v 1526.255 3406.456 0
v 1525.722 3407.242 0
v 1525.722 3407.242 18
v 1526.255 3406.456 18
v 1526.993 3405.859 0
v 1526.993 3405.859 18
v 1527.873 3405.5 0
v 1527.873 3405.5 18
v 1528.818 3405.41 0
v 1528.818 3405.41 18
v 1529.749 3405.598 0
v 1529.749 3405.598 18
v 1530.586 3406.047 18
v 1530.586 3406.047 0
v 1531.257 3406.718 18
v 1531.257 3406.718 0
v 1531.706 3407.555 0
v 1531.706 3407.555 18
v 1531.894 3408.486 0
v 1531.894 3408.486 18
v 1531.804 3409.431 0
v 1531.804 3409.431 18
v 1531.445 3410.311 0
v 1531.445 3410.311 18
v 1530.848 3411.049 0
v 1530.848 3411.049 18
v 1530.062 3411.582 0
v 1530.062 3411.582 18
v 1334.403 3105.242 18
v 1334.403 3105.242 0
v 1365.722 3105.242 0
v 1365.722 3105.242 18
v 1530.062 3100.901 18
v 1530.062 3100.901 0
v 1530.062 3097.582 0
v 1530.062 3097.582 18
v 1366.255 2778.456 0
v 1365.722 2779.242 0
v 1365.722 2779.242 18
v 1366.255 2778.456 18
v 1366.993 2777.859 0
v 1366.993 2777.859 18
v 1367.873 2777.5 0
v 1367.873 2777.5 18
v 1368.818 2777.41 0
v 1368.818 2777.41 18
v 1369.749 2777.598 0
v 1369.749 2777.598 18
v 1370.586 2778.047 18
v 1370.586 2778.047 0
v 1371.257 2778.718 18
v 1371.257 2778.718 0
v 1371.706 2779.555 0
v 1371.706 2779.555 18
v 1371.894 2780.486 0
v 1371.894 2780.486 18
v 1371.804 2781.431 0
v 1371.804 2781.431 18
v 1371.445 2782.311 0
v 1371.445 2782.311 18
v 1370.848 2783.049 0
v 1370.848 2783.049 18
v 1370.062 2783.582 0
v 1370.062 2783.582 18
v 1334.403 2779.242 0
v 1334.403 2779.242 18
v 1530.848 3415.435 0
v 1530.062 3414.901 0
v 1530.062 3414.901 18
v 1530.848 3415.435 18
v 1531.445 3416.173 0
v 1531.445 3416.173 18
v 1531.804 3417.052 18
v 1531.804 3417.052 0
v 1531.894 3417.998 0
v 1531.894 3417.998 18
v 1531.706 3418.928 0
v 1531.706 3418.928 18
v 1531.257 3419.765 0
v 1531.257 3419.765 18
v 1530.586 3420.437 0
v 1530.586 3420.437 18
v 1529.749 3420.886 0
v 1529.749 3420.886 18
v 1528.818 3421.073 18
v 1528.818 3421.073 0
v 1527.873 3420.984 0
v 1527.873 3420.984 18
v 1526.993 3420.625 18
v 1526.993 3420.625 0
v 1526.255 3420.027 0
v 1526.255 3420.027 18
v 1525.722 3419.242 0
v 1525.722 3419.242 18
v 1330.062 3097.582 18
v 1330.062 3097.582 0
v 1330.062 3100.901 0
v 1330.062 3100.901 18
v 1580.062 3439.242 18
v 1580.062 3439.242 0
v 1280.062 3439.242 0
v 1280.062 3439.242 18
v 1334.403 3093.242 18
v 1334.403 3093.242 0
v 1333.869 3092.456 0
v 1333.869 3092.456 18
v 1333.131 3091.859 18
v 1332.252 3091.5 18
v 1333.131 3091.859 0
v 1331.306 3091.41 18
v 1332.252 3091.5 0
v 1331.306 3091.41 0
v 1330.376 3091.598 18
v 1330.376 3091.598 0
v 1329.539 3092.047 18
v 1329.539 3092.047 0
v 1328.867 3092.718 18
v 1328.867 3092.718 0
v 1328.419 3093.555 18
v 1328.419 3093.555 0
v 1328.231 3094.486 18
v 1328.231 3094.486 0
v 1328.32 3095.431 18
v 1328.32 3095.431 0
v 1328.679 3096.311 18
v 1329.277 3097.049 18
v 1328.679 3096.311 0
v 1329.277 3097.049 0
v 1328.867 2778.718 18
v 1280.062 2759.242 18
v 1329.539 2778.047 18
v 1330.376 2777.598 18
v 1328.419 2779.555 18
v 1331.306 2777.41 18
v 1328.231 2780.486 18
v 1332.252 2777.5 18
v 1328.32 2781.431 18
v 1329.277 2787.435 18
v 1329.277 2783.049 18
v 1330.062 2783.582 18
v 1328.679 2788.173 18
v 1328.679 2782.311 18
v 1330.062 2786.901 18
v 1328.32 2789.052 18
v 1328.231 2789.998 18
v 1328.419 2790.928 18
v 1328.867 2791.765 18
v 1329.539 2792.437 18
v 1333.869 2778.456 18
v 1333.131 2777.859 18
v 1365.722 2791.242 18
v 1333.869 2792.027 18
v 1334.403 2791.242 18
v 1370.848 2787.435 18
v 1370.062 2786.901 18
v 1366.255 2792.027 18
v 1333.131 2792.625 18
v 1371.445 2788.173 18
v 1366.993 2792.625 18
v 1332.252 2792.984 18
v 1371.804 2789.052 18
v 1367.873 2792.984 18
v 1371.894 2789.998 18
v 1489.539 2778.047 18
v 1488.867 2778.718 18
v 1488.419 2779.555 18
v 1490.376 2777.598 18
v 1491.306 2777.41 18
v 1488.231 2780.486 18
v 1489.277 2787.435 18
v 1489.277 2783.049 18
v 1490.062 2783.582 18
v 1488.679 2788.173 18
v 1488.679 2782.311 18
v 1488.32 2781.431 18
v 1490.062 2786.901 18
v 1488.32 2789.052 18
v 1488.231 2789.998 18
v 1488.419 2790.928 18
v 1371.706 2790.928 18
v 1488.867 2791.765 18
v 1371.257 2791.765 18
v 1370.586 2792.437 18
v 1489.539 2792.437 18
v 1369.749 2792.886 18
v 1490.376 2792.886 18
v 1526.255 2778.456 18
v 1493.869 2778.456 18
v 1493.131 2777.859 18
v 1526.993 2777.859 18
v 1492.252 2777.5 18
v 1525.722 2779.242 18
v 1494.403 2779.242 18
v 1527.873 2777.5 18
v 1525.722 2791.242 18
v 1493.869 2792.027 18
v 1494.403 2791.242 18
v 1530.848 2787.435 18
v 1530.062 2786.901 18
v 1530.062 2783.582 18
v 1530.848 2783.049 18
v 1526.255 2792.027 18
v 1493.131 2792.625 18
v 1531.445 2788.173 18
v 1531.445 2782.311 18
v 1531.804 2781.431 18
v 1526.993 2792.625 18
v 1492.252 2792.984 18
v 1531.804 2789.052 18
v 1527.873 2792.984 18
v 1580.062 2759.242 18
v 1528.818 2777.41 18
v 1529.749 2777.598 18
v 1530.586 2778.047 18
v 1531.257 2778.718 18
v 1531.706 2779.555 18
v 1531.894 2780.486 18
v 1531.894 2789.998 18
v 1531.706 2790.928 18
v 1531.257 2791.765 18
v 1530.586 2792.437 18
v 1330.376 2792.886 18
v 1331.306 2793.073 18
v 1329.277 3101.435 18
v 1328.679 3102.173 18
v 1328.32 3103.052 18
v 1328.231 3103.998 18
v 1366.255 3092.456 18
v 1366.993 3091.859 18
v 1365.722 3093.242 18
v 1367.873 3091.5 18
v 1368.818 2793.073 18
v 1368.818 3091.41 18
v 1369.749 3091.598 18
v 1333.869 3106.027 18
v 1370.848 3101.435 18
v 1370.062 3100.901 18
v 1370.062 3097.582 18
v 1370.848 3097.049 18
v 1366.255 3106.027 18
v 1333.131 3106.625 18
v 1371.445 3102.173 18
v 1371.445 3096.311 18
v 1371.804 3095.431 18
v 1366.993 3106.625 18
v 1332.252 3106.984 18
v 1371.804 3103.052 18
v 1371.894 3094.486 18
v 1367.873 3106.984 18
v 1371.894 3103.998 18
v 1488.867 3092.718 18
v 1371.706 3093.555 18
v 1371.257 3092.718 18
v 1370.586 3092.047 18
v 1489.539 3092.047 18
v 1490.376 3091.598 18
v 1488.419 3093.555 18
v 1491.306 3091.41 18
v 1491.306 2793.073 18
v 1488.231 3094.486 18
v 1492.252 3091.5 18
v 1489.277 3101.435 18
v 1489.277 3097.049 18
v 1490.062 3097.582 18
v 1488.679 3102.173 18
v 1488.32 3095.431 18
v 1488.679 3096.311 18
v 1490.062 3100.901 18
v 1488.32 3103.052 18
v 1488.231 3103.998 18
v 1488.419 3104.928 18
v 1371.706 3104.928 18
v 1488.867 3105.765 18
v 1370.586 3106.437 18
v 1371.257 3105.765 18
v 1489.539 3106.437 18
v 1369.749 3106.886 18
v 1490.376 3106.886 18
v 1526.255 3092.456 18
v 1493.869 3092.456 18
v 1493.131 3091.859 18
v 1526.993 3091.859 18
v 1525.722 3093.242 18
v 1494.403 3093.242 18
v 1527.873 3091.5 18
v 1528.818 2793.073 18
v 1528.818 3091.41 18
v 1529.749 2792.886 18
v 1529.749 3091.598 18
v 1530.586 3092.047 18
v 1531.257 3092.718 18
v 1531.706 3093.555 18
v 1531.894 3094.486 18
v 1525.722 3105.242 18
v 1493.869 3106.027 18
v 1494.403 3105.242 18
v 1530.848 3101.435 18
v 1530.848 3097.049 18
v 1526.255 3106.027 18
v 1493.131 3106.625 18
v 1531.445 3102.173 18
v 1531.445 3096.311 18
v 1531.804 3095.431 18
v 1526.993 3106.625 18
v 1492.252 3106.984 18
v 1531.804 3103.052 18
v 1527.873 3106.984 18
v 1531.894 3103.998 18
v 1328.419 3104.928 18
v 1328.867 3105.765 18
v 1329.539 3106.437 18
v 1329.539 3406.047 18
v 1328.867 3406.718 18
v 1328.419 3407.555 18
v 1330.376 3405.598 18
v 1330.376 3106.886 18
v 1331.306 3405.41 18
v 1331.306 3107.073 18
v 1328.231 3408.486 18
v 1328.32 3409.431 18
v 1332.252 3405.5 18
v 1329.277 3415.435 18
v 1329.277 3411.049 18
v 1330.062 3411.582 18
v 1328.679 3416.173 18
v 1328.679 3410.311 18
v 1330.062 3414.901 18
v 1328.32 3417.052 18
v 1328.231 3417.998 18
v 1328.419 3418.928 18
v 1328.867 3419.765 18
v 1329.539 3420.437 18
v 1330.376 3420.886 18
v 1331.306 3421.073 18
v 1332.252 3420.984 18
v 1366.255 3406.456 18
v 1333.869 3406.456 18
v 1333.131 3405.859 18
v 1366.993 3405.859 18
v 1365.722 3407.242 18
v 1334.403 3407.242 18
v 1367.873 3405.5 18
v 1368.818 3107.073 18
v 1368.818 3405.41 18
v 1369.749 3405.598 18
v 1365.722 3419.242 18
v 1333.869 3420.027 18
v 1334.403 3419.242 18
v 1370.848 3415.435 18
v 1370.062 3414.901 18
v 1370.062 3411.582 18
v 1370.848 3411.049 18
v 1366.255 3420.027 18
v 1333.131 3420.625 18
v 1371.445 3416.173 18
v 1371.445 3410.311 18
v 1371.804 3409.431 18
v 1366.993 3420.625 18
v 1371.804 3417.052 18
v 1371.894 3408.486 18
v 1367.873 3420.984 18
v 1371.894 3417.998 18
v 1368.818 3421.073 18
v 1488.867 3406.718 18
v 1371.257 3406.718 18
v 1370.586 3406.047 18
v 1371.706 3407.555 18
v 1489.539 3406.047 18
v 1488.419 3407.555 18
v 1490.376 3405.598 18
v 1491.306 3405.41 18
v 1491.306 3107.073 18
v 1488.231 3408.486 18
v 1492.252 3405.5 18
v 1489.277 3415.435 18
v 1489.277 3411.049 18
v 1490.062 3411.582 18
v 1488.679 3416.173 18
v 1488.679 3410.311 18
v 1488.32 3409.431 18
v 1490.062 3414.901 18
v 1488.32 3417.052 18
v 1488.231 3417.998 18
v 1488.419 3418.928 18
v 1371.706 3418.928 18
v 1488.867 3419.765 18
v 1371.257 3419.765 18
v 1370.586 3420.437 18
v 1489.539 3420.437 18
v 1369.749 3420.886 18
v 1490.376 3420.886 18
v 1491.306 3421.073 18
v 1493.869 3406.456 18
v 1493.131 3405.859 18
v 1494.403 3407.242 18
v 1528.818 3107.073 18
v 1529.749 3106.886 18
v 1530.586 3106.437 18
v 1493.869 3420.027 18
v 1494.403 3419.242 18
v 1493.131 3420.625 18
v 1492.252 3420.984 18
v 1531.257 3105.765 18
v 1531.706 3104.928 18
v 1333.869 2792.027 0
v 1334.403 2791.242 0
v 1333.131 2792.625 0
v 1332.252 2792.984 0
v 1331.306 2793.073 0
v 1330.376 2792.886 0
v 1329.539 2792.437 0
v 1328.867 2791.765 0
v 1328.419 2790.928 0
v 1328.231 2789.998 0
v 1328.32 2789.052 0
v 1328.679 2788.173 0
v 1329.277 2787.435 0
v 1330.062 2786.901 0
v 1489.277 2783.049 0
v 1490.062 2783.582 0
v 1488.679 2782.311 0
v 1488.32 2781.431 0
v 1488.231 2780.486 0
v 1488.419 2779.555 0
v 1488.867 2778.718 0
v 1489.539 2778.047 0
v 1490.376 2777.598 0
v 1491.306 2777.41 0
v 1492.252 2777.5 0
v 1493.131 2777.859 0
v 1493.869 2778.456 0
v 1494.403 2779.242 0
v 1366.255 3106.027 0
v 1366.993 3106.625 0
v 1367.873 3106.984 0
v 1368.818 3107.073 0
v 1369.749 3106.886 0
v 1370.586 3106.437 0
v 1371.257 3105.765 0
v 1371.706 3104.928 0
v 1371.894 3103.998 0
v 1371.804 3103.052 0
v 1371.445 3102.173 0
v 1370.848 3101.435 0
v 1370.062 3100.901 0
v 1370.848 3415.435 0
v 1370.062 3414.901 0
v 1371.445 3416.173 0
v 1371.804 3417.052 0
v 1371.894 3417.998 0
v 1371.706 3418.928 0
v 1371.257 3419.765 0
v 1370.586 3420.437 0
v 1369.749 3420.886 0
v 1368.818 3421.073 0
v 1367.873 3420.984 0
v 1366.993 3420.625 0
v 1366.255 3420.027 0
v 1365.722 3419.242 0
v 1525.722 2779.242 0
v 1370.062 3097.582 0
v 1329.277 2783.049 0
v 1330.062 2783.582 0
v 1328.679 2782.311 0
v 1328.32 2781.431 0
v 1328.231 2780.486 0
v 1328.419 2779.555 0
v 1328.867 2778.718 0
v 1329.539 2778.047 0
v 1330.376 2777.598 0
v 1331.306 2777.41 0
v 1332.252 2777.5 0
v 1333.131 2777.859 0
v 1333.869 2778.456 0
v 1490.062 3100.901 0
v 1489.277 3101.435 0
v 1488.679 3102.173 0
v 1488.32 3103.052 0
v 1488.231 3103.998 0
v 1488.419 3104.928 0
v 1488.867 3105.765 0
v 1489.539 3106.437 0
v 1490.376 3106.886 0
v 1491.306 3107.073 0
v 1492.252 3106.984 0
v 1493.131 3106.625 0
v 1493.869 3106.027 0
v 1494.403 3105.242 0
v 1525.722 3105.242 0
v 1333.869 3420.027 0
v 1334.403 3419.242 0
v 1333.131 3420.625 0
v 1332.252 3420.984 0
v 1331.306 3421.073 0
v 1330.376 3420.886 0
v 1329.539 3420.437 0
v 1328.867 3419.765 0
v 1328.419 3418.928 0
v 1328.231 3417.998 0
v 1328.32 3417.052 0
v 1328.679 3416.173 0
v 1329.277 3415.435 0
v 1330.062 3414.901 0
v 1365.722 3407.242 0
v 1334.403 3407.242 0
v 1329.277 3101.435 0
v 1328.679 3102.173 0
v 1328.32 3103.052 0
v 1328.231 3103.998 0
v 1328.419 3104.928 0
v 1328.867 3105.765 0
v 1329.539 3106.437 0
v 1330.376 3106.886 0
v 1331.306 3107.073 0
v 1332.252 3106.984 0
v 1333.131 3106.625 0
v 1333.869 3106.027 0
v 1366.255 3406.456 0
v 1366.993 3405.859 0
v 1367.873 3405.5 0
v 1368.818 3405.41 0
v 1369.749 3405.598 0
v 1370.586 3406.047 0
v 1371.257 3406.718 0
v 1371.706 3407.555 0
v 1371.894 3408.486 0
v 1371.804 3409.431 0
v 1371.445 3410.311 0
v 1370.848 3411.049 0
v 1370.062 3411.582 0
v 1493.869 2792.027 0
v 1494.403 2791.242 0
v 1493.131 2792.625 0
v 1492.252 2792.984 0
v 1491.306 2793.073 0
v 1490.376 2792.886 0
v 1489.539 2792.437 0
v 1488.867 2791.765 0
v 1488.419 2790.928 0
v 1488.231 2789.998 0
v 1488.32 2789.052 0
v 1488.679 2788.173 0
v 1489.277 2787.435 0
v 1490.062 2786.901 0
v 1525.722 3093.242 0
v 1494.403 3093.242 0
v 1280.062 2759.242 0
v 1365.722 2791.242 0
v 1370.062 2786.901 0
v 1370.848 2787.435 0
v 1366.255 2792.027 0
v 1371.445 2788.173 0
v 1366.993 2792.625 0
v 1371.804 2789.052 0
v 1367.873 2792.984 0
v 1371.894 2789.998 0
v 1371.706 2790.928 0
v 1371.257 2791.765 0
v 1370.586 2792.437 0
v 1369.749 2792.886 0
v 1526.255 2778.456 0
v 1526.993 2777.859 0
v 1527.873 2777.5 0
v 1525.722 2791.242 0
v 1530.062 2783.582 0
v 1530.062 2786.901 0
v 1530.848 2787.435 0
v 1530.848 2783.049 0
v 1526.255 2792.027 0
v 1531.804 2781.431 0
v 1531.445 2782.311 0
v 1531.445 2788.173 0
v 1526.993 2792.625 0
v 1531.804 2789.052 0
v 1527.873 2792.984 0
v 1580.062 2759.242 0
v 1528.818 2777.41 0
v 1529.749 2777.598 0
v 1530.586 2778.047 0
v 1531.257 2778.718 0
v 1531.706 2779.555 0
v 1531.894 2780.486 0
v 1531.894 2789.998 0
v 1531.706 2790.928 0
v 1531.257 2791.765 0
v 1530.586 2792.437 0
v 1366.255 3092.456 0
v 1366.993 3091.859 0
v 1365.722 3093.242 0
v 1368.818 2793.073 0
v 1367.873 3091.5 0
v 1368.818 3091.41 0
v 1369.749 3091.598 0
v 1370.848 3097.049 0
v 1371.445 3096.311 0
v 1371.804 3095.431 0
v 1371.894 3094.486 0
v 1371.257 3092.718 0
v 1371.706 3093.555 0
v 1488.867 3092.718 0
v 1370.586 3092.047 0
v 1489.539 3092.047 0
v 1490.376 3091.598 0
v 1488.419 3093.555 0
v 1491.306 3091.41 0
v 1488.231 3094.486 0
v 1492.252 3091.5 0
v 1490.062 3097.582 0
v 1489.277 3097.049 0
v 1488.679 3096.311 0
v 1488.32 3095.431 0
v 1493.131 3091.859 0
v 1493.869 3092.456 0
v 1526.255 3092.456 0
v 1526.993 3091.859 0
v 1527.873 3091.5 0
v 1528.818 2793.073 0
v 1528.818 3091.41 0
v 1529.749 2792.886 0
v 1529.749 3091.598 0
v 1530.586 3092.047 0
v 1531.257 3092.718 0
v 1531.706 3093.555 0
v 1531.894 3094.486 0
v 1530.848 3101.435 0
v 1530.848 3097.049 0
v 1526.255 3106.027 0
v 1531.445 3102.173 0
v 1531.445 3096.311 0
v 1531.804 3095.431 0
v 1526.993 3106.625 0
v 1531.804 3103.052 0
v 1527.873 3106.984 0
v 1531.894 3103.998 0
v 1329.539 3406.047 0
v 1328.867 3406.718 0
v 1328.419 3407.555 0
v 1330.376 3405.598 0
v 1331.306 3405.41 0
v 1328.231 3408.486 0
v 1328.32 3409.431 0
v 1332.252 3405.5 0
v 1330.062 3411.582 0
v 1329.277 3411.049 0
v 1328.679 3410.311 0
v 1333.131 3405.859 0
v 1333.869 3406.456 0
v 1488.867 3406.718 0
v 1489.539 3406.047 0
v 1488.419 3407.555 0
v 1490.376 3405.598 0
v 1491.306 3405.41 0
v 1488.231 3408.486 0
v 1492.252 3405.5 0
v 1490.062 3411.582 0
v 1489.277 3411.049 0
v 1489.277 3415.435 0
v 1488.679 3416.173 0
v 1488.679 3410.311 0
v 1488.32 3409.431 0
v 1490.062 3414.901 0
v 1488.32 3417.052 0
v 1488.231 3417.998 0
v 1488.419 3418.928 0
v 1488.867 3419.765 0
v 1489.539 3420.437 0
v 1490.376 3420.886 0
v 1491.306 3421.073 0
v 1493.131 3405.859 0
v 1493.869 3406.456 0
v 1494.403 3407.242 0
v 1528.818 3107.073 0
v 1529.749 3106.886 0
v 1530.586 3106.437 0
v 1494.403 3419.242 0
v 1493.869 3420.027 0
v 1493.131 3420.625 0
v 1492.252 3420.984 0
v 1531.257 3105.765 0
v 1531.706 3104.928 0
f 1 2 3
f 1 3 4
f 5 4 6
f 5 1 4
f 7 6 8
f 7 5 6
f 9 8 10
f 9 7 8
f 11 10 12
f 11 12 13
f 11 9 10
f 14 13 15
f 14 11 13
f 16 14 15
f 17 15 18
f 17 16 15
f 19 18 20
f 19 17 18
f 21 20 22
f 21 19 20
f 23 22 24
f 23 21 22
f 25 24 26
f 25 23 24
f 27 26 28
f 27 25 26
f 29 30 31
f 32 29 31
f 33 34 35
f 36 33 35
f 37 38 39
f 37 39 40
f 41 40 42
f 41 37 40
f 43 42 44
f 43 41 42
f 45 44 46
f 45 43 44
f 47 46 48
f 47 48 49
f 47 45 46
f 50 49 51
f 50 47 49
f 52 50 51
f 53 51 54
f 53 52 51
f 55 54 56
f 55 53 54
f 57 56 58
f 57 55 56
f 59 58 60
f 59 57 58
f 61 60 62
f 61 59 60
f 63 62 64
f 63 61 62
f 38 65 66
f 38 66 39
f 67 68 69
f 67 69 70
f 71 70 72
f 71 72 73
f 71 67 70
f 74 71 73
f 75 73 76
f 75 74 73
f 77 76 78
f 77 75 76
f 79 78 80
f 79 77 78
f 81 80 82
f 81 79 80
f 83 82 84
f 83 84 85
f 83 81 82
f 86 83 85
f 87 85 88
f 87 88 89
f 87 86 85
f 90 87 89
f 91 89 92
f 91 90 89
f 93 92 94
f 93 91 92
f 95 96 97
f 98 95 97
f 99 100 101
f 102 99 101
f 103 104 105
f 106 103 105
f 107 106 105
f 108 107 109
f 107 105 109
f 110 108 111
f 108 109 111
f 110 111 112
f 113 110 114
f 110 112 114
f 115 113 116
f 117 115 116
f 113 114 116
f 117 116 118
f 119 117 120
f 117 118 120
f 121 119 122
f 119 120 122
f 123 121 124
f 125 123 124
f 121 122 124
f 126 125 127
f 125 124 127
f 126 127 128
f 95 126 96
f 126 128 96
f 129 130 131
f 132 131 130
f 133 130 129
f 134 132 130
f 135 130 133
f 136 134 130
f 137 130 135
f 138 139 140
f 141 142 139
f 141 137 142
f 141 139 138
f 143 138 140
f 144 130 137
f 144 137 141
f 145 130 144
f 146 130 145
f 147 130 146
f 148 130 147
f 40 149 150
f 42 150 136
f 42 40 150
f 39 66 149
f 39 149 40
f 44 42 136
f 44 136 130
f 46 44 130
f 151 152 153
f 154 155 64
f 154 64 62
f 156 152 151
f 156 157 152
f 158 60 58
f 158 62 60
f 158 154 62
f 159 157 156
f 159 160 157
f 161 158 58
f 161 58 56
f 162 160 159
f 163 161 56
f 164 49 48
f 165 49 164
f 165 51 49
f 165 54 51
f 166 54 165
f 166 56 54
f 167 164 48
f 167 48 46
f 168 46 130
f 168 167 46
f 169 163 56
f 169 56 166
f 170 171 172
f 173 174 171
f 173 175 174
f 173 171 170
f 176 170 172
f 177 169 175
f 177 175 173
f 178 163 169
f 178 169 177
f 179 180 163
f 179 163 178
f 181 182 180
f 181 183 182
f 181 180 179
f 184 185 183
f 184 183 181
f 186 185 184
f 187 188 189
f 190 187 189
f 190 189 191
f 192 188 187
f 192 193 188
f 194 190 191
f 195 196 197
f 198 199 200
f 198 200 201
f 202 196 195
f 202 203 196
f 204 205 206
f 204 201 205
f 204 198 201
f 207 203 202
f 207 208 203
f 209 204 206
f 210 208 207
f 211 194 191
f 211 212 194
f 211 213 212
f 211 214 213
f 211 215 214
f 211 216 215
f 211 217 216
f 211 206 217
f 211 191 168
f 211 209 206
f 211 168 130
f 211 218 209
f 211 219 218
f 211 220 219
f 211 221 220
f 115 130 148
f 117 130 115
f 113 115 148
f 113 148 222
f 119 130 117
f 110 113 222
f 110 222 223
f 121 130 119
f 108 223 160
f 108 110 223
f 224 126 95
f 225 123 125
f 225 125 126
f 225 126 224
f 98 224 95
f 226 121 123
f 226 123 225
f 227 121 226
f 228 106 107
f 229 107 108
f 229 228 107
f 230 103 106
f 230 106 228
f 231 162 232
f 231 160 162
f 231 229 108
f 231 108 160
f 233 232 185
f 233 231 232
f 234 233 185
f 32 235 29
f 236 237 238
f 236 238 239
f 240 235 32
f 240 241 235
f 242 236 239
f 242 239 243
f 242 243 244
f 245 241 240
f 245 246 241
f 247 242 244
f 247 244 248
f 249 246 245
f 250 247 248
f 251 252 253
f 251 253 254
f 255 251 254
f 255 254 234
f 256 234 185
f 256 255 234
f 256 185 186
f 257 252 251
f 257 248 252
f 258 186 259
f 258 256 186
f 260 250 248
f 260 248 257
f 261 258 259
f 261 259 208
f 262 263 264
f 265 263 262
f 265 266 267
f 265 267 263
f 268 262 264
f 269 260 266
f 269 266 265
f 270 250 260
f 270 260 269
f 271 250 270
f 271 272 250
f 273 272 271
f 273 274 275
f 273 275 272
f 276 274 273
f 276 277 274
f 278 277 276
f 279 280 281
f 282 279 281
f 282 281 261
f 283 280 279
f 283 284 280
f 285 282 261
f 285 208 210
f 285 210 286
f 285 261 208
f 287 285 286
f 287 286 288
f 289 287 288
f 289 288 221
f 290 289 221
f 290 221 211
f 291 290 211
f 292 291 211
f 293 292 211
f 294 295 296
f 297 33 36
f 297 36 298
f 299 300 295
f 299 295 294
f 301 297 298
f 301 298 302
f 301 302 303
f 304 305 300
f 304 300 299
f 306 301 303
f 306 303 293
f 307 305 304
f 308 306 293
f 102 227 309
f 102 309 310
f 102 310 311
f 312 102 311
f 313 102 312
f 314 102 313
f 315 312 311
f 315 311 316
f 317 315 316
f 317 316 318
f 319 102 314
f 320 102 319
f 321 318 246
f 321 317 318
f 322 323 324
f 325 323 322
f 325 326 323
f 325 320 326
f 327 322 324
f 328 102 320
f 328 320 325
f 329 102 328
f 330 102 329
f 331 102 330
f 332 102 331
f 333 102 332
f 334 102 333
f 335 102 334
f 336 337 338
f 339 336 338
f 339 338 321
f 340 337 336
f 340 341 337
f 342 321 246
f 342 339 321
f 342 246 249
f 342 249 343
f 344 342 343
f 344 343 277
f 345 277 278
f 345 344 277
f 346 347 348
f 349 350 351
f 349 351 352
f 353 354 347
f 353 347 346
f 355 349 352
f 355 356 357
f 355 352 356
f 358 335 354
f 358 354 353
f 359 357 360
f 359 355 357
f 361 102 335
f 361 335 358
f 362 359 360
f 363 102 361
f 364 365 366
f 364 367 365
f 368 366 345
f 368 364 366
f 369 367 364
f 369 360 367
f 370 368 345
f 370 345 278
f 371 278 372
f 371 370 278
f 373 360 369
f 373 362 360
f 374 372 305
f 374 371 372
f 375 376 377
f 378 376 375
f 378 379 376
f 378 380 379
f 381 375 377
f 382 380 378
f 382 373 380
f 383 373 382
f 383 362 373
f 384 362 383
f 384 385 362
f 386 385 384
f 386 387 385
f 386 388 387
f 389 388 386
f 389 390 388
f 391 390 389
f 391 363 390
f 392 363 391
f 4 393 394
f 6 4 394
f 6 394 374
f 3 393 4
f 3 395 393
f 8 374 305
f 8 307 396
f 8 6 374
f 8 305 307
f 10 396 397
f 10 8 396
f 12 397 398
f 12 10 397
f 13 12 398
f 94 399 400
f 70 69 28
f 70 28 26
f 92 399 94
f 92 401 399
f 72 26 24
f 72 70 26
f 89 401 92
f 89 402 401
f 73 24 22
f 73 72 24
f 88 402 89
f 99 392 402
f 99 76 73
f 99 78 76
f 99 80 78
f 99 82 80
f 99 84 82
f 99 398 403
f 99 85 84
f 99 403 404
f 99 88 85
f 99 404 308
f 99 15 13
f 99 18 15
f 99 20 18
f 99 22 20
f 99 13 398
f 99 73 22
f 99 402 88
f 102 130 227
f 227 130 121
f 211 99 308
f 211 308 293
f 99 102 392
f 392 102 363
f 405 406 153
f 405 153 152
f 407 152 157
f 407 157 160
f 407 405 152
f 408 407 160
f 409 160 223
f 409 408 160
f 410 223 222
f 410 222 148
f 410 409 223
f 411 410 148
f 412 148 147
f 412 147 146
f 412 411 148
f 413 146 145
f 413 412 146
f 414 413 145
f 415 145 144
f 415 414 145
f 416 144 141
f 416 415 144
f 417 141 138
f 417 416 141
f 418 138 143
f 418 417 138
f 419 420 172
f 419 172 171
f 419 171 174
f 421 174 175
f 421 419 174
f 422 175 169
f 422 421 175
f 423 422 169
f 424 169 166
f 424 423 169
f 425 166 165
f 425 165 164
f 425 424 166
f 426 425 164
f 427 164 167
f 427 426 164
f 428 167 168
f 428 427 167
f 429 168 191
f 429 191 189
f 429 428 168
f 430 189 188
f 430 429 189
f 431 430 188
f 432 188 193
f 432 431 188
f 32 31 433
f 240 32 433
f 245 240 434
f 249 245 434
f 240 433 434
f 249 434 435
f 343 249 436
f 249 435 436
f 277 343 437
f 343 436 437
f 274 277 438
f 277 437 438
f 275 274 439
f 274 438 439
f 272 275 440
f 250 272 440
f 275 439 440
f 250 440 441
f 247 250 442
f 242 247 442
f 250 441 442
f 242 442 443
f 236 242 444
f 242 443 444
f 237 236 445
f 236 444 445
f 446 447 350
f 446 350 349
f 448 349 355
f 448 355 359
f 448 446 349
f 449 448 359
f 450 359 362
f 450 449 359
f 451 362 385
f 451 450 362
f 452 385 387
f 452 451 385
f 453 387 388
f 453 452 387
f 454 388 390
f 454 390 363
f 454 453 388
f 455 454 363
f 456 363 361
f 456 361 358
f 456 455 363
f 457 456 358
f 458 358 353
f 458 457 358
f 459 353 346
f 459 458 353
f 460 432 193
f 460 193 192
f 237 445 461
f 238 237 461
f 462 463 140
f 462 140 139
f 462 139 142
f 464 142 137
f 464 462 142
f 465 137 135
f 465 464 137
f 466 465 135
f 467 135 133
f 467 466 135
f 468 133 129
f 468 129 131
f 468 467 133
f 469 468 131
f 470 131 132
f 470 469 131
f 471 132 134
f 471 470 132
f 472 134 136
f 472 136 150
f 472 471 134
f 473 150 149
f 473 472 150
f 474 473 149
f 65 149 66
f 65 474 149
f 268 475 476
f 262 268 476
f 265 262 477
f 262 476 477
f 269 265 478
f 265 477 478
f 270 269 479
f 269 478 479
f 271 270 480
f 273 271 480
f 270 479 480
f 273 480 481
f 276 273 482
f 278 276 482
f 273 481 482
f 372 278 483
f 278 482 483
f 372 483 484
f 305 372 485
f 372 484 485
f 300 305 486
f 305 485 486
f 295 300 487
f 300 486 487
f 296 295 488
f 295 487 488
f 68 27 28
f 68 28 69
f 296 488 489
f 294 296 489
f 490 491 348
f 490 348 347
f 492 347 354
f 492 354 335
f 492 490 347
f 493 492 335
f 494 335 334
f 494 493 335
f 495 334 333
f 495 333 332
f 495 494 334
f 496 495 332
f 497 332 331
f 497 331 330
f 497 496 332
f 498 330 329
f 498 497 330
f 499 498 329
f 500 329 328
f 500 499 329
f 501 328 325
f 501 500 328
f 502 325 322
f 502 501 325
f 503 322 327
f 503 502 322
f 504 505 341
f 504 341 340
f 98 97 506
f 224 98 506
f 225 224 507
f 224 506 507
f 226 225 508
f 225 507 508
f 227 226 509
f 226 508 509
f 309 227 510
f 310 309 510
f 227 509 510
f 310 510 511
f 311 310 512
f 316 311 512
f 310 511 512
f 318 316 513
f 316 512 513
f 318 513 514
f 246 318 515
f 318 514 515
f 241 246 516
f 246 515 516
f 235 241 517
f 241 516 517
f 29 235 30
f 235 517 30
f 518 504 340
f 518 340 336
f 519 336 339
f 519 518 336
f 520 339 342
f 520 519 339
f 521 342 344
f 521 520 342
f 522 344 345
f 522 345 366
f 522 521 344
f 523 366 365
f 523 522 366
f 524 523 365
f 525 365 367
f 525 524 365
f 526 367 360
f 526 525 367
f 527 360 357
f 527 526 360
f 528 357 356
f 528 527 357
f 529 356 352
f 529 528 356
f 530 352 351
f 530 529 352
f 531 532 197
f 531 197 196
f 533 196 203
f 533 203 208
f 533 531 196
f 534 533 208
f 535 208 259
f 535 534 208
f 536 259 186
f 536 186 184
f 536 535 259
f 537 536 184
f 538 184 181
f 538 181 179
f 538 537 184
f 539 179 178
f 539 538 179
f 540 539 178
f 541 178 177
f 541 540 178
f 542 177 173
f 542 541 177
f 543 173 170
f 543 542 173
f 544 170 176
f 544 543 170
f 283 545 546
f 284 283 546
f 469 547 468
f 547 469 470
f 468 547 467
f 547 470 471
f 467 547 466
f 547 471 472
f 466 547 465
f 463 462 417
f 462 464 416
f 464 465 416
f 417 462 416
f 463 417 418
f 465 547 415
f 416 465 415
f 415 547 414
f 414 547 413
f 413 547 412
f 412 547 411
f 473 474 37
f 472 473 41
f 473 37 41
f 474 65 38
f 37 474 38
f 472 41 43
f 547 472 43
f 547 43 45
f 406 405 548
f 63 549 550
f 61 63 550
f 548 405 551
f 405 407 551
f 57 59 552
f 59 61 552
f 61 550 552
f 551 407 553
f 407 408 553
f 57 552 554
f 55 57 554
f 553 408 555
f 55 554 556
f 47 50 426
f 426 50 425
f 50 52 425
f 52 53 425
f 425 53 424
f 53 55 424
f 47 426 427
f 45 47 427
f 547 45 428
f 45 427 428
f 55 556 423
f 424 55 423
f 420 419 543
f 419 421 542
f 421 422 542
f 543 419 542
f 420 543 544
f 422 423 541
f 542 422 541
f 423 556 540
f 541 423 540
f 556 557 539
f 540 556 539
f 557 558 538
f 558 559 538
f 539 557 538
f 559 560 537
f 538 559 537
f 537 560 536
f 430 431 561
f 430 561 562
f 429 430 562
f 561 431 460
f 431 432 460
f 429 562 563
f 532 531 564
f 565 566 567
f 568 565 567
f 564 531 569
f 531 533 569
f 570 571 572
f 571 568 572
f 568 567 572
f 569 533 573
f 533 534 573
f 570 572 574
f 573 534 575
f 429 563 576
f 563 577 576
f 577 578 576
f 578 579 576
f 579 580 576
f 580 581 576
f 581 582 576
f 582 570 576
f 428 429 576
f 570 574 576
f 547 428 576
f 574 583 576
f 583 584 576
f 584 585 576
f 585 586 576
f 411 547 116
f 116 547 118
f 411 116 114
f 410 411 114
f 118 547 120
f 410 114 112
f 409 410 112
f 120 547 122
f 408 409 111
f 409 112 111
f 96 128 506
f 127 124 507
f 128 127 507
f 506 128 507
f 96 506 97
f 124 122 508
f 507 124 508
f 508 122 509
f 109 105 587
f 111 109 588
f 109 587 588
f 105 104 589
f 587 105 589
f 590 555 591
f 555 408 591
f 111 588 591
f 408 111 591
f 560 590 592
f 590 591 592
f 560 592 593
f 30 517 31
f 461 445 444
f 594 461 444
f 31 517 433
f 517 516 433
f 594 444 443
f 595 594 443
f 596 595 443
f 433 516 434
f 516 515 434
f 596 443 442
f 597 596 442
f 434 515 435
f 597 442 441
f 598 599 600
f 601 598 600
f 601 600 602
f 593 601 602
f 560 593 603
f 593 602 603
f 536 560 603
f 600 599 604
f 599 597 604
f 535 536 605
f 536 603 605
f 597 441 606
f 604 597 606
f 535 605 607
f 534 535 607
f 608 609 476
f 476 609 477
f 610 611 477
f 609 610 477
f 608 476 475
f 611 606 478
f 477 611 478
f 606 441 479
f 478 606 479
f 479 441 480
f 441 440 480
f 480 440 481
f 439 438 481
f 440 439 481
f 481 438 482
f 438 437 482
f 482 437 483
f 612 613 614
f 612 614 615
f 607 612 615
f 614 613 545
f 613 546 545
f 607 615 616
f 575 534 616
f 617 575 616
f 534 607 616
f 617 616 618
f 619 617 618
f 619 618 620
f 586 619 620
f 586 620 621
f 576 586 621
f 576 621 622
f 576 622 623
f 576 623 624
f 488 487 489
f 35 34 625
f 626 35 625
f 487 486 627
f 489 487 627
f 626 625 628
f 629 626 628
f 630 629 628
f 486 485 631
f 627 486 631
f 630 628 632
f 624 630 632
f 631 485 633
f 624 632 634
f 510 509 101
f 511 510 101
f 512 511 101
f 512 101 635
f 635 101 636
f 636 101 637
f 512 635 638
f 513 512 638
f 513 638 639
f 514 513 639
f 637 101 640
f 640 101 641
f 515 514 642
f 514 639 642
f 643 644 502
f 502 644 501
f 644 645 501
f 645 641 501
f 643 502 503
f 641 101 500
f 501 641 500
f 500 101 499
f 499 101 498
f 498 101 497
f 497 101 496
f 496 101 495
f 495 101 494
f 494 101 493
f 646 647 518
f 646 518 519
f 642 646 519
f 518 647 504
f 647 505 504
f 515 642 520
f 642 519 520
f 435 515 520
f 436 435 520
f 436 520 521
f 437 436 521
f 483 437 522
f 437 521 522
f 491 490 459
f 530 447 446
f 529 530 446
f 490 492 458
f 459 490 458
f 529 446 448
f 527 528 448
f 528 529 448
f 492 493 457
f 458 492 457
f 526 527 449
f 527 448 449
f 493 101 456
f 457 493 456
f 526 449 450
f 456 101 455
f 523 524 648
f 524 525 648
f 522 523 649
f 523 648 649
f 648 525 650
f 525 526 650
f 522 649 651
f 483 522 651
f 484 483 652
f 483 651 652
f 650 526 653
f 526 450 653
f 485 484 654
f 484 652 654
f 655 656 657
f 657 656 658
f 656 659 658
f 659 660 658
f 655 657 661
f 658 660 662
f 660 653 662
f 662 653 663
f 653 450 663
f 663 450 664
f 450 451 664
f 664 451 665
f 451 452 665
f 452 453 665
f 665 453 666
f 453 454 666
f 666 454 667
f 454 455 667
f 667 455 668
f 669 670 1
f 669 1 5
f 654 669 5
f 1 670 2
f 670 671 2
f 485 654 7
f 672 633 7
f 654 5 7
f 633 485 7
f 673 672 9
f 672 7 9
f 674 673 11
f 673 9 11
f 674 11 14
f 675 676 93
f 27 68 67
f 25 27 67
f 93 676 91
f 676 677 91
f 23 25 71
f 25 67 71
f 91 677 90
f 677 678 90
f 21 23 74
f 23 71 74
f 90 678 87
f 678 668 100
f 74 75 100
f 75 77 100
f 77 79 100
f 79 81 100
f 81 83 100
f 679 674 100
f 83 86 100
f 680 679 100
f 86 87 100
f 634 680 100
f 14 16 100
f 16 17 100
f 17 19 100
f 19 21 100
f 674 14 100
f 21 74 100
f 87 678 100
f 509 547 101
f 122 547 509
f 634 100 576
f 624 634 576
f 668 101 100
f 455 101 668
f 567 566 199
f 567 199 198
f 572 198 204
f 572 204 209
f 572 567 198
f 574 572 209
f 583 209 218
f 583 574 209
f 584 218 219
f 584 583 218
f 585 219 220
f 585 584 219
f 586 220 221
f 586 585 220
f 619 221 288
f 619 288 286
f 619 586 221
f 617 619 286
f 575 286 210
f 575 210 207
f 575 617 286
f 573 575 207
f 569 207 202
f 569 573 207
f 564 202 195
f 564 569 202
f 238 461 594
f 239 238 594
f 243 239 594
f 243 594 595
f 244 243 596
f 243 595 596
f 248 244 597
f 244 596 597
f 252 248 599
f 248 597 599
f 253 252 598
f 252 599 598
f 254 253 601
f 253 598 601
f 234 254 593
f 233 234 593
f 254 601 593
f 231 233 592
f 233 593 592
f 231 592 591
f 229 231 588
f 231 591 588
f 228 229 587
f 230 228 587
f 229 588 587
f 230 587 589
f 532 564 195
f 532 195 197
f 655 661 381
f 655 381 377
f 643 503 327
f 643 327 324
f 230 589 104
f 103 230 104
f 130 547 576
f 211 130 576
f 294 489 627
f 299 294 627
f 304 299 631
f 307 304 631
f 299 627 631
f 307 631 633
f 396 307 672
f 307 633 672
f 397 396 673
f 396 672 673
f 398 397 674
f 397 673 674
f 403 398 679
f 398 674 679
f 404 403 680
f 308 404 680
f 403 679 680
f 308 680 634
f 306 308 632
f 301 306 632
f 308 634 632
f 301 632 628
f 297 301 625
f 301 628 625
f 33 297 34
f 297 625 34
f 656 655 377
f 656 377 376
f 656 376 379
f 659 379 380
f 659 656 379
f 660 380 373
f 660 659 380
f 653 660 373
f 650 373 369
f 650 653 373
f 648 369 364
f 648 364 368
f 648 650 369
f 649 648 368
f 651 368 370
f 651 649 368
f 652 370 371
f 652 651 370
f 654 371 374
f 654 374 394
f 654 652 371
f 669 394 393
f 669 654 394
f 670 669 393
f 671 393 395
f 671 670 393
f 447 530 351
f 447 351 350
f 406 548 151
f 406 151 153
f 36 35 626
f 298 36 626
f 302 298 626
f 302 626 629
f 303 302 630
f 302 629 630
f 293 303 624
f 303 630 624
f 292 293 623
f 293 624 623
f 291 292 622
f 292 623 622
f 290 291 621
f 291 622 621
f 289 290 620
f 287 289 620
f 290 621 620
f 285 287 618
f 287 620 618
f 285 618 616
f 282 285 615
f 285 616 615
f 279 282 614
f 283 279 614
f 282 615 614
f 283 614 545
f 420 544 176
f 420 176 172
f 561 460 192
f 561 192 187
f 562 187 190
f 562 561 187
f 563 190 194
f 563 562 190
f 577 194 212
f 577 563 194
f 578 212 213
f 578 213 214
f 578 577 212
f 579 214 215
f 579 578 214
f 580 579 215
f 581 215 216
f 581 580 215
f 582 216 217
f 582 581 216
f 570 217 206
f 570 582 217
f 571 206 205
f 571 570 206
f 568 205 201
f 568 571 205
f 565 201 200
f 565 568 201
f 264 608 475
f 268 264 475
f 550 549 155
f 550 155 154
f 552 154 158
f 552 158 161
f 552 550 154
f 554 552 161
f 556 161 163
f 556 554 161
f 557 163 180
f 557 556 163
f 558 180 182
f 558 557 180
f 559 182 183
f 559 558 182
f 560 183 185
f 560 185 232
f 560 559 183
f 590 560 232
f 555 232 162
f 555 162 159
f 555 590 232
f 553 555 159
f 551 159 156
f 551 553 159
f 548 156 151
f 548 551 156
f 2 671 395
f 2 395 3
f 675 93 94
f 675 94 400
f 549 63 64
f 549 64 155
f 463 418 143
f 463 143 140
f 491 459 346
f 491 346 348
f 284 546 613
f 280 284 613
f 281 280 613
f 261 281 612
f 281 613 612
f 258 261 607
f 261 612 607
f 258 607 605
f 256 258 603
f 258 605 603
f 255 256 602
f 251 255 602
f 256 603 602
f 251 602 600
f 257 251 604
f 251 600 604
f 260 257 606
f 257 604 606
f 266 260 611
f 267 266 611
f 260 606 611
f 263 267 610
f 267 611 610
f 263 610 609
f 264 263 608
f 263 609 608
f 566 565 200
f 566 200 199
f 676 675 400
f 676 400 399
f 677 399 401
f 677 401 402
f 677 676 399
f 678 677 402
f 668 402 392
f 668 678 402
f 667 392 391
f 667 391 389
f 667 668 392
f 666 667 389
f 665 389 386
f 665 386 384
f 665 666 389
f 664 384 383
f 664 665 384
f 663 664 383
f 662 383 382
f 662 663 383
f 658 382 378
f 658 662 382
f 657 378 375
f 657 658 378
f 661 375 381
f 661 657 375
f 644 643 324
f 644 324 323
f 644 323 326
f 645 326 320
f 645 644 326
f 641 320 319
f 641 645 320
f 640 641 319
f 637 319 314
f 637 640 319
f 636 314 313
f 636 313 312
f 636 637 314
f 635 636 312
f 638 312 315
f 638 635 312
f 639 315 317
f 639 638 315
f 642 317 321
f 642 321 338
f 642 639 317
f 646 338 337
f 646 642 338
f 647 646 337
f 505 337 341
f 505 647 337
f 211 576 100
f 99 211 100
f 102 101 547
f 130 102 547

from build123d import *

# Parameters (mm, degrees)
BOSS_EXTRUDE1_DEPTH = 18


with BuildPart() as part:
    # Sketch1 → Boss-Extrude1 (new body)
    with BuildSketch(Plane.XY):
        Polygon((1280.062211089, 3439.241832817), (1280.062211089, 3419.241832817), (1280.062211089, 3407.241832817), (1280.062211089, 3105.241832817), (1280.062211089, 3093.241832817), (1280.062211089, 2791.241832817), (1280.062211089, 2779.241832817), (1280.062211089, 2759.241832817), (1580.062211089, 2759.241832817), (1580.062211089, 2779.241832817), (1580.062211089, 2791.241832817), (1580.062211089, 3093.241832817), (1580.062211089, 3105.241832817), (1580.062211089, 3407.241832817), (1580.062211089, 3419.241832817), (1580.062211089, 3439.241832817), align=None)
        with BuildLine():
            Line((1525.721822549, 3093.241832817), (1494.402599629, 3093.241832817))
            ThreePointArc((1494.402599629, 3093.241832817), (1489.178327612, 3092.357949341), (1490.062211089, 3097.582221357))
            Line((1490.062211089, 3097.582221357), (1490.062211089, 3100.901444277))
            ThreePointArc((1490.062211089, 3100.901444277), (1489.178327612, 3106.125716294), (1494.402599629, 3105.241832817))
            Line((1494.402599629, 3105.241832817), (1525.721822549, 3105.241832817))
            ThreePointArc((1525.721822549, 3105.241832817), (1530.946094565, 3106.125716294), (1530.062211089, 3100.901444277))
            Line((1530.062211089, 3100.901444277), (1530.062211089, 3097.582221357))
            ThreePointArc((1530.062211089, 3097.582221357), (1530.946094565, 3092.357949341), (1525.721822549, 3093.241832817))
        make_face(mode=Mode.SUBTRACT)
        with BuildLine():
            Line((1365.721822549, 2791.241832817), (1334.402599629, 2791.241832817))
            ThreePointArc((1334.402599629, 2791.241832817), (1329.178327612, 2792.125716294), (1330.062211089, 2786.901444277))
            Line((1330.062211089, 2786.901444277), (1330.062211089, 2783.582221357))
            ThreePointArc((1330.062211089, 2783.582221357), (1329.178327612, 2778.357949341), (1334.402599629, 2779.241832817))
            Line((1334.402599629, 2779.241832817), (1365.721822549, 2779.241832817))
            ThreePointArc((1365.721822549, 2779.241832817), (1370.946094565, 2778.357949341), (1370.062211089, 2783.582221357))
            Line((1370.062211089, 2783.582221357), (1370.062211089, 2786.901444277))
            ThreePointArc((1370.062211089, 2786.901444277), (1370.946094565, 2792.125716294), (1365.721822549, 2791.241832817))
        make_face(mode=Mode.SUBTRACT)
        with BuildLine():
            Line((1330.062211089, 3414.901444277), (1330.062211089, 3411.582221357))
            ThreePointArc((1330.062211089, 3411.582221357), (1329.178327612, 3406.357949341), (1334.402599629, 3407.241832817))
            Line((1334.402599629, 3407.241832817), (1365.721822549, 3407.241832817))
            ThreePointArc((1365.721822549, 3407.241832817), (1370.946094565, 3406.357949341), (1370.062211089, 3411.582221357))
            Line((1370.062211089, 3411.582221357), (1370.062211089, 3414.901444277))
            ThreePointArc((1370.062211089, 3414.901444277), (1370.946094565, 3420.125716294), (1365.721822549, 3419.241832817))
            Line((1365.721822549, 3419.241832817), (1334.402599629, 3419.241832817))
            ThreePointArc((1334.402599629, 3419.241832817), (1329.178327612, 3420.125716294), (1330.062211089, 3414.901444277))
        make_face(mode=Mode.SUBTRACT)
        with BuildLine():
            Line((1334.402599629, 3105.241832817), (1365.721822549, 3105.241832817))
            ThreePointArc((1365.721822549, 3105.241832817), (1370.946094565, 3106.125716294), (1370.062211089, 3100.901444277))
            Line((1370.062211089, 3100.901444277), (1370.062211089, 3097.582221357))
            ThreePointArc((1370.062211089, 3097.582221357), (1370.946094565, 3092.357949341), (1365.721822549, 3093.241832817))
            Line((1365.721822549, 3093.241832817), (1334.402599629, 3093.241832817))
            ThreePointArc((1334.402599629, 3093.241832817), (1329.178327612, 3092.357949341), (1330.062211089, 3097.582221357))
            Line((1330.062211089, 3097.582221357), (1330.062211089, 3100.901444277))
            ThreePointArc((1330.062211089, 3100.901444277), (1329.178327612, 3106.125716294), (1334.402599629, 3105.241832817))
        make_face(mode=Mode.SUBTRACT)
        with BuildLine():
            Line((1530.062211089, 2783.582221357), (1530.062211089, 2786.901444277))
            ThreePointArc((1530.062211089, 2786.901444277), (1530.946094565, 2792.125716294), (1525.721822549, 2791.241832817))
            Line((1525.721822549, 2791.241832817), (1494.402599629, 2791.241832817))
            ThreePointArc((1494.402599629, 2791.241832817), (1489.178327612, 2792.125716294), (1490.062211089, 2786.901444277))
            Line((1490.062211089, 2786.901444277), (1490.062211089, 2783.582221357))
            ThreePointArc((1490.062211089, 2783.582221357), (1489.178327612, 2778.357949341), (1494.402599629, 2779.241832817))
            Line((1494.402599629, 2779.241832817), (1525.721822549, 2779.241832817))
            ThreePointArc((1525.721822549, 2779.241832817), (1530.946094565, 2778.357949341), (1530.062211089, 2783.582221357))
        make_face(mode=Mode.SUBTRACT)
        with BuildLine():
            Line((1494.402599629, 3407.241832817), (1525.721822549, 3407.241832817))
            ThreePointArc((1525.721822549, 3407.241832817), (1530.946094565, 3406.357949341), (1530.062211089, 3411.582221357))
            Line((1530.062211089, 3411.582221357), (1530.062211089, 3414.901444277))
            ThreePointArc((1530.062211089, 3414.901444277), (1530.946094565, 3420.125716294), (1525.721822549, 3419.241832817))
            Line((1525.721822549, 3419.241832817), (1494.402599629, 3419.241832817))
            ThreePointArc((1494.402599629, 3419.241832817), (1489.178327612, 3420.125716294), (1490.062211089, 3414.901444277))
            Line((1490.062211089, 3414.901444277), (1490.062211089, 3411.582221357))
            ThreePointArc((1490.062211089, 3411.582221357), (1489.178327612, 3406.357949341), (1494.402599629, 3407.241832817))
        make_face(mode=Mode.SUBTRACT)
    extrude(amount=BOSS_EXTRUDE1_DEPTH)


solid = part.part
